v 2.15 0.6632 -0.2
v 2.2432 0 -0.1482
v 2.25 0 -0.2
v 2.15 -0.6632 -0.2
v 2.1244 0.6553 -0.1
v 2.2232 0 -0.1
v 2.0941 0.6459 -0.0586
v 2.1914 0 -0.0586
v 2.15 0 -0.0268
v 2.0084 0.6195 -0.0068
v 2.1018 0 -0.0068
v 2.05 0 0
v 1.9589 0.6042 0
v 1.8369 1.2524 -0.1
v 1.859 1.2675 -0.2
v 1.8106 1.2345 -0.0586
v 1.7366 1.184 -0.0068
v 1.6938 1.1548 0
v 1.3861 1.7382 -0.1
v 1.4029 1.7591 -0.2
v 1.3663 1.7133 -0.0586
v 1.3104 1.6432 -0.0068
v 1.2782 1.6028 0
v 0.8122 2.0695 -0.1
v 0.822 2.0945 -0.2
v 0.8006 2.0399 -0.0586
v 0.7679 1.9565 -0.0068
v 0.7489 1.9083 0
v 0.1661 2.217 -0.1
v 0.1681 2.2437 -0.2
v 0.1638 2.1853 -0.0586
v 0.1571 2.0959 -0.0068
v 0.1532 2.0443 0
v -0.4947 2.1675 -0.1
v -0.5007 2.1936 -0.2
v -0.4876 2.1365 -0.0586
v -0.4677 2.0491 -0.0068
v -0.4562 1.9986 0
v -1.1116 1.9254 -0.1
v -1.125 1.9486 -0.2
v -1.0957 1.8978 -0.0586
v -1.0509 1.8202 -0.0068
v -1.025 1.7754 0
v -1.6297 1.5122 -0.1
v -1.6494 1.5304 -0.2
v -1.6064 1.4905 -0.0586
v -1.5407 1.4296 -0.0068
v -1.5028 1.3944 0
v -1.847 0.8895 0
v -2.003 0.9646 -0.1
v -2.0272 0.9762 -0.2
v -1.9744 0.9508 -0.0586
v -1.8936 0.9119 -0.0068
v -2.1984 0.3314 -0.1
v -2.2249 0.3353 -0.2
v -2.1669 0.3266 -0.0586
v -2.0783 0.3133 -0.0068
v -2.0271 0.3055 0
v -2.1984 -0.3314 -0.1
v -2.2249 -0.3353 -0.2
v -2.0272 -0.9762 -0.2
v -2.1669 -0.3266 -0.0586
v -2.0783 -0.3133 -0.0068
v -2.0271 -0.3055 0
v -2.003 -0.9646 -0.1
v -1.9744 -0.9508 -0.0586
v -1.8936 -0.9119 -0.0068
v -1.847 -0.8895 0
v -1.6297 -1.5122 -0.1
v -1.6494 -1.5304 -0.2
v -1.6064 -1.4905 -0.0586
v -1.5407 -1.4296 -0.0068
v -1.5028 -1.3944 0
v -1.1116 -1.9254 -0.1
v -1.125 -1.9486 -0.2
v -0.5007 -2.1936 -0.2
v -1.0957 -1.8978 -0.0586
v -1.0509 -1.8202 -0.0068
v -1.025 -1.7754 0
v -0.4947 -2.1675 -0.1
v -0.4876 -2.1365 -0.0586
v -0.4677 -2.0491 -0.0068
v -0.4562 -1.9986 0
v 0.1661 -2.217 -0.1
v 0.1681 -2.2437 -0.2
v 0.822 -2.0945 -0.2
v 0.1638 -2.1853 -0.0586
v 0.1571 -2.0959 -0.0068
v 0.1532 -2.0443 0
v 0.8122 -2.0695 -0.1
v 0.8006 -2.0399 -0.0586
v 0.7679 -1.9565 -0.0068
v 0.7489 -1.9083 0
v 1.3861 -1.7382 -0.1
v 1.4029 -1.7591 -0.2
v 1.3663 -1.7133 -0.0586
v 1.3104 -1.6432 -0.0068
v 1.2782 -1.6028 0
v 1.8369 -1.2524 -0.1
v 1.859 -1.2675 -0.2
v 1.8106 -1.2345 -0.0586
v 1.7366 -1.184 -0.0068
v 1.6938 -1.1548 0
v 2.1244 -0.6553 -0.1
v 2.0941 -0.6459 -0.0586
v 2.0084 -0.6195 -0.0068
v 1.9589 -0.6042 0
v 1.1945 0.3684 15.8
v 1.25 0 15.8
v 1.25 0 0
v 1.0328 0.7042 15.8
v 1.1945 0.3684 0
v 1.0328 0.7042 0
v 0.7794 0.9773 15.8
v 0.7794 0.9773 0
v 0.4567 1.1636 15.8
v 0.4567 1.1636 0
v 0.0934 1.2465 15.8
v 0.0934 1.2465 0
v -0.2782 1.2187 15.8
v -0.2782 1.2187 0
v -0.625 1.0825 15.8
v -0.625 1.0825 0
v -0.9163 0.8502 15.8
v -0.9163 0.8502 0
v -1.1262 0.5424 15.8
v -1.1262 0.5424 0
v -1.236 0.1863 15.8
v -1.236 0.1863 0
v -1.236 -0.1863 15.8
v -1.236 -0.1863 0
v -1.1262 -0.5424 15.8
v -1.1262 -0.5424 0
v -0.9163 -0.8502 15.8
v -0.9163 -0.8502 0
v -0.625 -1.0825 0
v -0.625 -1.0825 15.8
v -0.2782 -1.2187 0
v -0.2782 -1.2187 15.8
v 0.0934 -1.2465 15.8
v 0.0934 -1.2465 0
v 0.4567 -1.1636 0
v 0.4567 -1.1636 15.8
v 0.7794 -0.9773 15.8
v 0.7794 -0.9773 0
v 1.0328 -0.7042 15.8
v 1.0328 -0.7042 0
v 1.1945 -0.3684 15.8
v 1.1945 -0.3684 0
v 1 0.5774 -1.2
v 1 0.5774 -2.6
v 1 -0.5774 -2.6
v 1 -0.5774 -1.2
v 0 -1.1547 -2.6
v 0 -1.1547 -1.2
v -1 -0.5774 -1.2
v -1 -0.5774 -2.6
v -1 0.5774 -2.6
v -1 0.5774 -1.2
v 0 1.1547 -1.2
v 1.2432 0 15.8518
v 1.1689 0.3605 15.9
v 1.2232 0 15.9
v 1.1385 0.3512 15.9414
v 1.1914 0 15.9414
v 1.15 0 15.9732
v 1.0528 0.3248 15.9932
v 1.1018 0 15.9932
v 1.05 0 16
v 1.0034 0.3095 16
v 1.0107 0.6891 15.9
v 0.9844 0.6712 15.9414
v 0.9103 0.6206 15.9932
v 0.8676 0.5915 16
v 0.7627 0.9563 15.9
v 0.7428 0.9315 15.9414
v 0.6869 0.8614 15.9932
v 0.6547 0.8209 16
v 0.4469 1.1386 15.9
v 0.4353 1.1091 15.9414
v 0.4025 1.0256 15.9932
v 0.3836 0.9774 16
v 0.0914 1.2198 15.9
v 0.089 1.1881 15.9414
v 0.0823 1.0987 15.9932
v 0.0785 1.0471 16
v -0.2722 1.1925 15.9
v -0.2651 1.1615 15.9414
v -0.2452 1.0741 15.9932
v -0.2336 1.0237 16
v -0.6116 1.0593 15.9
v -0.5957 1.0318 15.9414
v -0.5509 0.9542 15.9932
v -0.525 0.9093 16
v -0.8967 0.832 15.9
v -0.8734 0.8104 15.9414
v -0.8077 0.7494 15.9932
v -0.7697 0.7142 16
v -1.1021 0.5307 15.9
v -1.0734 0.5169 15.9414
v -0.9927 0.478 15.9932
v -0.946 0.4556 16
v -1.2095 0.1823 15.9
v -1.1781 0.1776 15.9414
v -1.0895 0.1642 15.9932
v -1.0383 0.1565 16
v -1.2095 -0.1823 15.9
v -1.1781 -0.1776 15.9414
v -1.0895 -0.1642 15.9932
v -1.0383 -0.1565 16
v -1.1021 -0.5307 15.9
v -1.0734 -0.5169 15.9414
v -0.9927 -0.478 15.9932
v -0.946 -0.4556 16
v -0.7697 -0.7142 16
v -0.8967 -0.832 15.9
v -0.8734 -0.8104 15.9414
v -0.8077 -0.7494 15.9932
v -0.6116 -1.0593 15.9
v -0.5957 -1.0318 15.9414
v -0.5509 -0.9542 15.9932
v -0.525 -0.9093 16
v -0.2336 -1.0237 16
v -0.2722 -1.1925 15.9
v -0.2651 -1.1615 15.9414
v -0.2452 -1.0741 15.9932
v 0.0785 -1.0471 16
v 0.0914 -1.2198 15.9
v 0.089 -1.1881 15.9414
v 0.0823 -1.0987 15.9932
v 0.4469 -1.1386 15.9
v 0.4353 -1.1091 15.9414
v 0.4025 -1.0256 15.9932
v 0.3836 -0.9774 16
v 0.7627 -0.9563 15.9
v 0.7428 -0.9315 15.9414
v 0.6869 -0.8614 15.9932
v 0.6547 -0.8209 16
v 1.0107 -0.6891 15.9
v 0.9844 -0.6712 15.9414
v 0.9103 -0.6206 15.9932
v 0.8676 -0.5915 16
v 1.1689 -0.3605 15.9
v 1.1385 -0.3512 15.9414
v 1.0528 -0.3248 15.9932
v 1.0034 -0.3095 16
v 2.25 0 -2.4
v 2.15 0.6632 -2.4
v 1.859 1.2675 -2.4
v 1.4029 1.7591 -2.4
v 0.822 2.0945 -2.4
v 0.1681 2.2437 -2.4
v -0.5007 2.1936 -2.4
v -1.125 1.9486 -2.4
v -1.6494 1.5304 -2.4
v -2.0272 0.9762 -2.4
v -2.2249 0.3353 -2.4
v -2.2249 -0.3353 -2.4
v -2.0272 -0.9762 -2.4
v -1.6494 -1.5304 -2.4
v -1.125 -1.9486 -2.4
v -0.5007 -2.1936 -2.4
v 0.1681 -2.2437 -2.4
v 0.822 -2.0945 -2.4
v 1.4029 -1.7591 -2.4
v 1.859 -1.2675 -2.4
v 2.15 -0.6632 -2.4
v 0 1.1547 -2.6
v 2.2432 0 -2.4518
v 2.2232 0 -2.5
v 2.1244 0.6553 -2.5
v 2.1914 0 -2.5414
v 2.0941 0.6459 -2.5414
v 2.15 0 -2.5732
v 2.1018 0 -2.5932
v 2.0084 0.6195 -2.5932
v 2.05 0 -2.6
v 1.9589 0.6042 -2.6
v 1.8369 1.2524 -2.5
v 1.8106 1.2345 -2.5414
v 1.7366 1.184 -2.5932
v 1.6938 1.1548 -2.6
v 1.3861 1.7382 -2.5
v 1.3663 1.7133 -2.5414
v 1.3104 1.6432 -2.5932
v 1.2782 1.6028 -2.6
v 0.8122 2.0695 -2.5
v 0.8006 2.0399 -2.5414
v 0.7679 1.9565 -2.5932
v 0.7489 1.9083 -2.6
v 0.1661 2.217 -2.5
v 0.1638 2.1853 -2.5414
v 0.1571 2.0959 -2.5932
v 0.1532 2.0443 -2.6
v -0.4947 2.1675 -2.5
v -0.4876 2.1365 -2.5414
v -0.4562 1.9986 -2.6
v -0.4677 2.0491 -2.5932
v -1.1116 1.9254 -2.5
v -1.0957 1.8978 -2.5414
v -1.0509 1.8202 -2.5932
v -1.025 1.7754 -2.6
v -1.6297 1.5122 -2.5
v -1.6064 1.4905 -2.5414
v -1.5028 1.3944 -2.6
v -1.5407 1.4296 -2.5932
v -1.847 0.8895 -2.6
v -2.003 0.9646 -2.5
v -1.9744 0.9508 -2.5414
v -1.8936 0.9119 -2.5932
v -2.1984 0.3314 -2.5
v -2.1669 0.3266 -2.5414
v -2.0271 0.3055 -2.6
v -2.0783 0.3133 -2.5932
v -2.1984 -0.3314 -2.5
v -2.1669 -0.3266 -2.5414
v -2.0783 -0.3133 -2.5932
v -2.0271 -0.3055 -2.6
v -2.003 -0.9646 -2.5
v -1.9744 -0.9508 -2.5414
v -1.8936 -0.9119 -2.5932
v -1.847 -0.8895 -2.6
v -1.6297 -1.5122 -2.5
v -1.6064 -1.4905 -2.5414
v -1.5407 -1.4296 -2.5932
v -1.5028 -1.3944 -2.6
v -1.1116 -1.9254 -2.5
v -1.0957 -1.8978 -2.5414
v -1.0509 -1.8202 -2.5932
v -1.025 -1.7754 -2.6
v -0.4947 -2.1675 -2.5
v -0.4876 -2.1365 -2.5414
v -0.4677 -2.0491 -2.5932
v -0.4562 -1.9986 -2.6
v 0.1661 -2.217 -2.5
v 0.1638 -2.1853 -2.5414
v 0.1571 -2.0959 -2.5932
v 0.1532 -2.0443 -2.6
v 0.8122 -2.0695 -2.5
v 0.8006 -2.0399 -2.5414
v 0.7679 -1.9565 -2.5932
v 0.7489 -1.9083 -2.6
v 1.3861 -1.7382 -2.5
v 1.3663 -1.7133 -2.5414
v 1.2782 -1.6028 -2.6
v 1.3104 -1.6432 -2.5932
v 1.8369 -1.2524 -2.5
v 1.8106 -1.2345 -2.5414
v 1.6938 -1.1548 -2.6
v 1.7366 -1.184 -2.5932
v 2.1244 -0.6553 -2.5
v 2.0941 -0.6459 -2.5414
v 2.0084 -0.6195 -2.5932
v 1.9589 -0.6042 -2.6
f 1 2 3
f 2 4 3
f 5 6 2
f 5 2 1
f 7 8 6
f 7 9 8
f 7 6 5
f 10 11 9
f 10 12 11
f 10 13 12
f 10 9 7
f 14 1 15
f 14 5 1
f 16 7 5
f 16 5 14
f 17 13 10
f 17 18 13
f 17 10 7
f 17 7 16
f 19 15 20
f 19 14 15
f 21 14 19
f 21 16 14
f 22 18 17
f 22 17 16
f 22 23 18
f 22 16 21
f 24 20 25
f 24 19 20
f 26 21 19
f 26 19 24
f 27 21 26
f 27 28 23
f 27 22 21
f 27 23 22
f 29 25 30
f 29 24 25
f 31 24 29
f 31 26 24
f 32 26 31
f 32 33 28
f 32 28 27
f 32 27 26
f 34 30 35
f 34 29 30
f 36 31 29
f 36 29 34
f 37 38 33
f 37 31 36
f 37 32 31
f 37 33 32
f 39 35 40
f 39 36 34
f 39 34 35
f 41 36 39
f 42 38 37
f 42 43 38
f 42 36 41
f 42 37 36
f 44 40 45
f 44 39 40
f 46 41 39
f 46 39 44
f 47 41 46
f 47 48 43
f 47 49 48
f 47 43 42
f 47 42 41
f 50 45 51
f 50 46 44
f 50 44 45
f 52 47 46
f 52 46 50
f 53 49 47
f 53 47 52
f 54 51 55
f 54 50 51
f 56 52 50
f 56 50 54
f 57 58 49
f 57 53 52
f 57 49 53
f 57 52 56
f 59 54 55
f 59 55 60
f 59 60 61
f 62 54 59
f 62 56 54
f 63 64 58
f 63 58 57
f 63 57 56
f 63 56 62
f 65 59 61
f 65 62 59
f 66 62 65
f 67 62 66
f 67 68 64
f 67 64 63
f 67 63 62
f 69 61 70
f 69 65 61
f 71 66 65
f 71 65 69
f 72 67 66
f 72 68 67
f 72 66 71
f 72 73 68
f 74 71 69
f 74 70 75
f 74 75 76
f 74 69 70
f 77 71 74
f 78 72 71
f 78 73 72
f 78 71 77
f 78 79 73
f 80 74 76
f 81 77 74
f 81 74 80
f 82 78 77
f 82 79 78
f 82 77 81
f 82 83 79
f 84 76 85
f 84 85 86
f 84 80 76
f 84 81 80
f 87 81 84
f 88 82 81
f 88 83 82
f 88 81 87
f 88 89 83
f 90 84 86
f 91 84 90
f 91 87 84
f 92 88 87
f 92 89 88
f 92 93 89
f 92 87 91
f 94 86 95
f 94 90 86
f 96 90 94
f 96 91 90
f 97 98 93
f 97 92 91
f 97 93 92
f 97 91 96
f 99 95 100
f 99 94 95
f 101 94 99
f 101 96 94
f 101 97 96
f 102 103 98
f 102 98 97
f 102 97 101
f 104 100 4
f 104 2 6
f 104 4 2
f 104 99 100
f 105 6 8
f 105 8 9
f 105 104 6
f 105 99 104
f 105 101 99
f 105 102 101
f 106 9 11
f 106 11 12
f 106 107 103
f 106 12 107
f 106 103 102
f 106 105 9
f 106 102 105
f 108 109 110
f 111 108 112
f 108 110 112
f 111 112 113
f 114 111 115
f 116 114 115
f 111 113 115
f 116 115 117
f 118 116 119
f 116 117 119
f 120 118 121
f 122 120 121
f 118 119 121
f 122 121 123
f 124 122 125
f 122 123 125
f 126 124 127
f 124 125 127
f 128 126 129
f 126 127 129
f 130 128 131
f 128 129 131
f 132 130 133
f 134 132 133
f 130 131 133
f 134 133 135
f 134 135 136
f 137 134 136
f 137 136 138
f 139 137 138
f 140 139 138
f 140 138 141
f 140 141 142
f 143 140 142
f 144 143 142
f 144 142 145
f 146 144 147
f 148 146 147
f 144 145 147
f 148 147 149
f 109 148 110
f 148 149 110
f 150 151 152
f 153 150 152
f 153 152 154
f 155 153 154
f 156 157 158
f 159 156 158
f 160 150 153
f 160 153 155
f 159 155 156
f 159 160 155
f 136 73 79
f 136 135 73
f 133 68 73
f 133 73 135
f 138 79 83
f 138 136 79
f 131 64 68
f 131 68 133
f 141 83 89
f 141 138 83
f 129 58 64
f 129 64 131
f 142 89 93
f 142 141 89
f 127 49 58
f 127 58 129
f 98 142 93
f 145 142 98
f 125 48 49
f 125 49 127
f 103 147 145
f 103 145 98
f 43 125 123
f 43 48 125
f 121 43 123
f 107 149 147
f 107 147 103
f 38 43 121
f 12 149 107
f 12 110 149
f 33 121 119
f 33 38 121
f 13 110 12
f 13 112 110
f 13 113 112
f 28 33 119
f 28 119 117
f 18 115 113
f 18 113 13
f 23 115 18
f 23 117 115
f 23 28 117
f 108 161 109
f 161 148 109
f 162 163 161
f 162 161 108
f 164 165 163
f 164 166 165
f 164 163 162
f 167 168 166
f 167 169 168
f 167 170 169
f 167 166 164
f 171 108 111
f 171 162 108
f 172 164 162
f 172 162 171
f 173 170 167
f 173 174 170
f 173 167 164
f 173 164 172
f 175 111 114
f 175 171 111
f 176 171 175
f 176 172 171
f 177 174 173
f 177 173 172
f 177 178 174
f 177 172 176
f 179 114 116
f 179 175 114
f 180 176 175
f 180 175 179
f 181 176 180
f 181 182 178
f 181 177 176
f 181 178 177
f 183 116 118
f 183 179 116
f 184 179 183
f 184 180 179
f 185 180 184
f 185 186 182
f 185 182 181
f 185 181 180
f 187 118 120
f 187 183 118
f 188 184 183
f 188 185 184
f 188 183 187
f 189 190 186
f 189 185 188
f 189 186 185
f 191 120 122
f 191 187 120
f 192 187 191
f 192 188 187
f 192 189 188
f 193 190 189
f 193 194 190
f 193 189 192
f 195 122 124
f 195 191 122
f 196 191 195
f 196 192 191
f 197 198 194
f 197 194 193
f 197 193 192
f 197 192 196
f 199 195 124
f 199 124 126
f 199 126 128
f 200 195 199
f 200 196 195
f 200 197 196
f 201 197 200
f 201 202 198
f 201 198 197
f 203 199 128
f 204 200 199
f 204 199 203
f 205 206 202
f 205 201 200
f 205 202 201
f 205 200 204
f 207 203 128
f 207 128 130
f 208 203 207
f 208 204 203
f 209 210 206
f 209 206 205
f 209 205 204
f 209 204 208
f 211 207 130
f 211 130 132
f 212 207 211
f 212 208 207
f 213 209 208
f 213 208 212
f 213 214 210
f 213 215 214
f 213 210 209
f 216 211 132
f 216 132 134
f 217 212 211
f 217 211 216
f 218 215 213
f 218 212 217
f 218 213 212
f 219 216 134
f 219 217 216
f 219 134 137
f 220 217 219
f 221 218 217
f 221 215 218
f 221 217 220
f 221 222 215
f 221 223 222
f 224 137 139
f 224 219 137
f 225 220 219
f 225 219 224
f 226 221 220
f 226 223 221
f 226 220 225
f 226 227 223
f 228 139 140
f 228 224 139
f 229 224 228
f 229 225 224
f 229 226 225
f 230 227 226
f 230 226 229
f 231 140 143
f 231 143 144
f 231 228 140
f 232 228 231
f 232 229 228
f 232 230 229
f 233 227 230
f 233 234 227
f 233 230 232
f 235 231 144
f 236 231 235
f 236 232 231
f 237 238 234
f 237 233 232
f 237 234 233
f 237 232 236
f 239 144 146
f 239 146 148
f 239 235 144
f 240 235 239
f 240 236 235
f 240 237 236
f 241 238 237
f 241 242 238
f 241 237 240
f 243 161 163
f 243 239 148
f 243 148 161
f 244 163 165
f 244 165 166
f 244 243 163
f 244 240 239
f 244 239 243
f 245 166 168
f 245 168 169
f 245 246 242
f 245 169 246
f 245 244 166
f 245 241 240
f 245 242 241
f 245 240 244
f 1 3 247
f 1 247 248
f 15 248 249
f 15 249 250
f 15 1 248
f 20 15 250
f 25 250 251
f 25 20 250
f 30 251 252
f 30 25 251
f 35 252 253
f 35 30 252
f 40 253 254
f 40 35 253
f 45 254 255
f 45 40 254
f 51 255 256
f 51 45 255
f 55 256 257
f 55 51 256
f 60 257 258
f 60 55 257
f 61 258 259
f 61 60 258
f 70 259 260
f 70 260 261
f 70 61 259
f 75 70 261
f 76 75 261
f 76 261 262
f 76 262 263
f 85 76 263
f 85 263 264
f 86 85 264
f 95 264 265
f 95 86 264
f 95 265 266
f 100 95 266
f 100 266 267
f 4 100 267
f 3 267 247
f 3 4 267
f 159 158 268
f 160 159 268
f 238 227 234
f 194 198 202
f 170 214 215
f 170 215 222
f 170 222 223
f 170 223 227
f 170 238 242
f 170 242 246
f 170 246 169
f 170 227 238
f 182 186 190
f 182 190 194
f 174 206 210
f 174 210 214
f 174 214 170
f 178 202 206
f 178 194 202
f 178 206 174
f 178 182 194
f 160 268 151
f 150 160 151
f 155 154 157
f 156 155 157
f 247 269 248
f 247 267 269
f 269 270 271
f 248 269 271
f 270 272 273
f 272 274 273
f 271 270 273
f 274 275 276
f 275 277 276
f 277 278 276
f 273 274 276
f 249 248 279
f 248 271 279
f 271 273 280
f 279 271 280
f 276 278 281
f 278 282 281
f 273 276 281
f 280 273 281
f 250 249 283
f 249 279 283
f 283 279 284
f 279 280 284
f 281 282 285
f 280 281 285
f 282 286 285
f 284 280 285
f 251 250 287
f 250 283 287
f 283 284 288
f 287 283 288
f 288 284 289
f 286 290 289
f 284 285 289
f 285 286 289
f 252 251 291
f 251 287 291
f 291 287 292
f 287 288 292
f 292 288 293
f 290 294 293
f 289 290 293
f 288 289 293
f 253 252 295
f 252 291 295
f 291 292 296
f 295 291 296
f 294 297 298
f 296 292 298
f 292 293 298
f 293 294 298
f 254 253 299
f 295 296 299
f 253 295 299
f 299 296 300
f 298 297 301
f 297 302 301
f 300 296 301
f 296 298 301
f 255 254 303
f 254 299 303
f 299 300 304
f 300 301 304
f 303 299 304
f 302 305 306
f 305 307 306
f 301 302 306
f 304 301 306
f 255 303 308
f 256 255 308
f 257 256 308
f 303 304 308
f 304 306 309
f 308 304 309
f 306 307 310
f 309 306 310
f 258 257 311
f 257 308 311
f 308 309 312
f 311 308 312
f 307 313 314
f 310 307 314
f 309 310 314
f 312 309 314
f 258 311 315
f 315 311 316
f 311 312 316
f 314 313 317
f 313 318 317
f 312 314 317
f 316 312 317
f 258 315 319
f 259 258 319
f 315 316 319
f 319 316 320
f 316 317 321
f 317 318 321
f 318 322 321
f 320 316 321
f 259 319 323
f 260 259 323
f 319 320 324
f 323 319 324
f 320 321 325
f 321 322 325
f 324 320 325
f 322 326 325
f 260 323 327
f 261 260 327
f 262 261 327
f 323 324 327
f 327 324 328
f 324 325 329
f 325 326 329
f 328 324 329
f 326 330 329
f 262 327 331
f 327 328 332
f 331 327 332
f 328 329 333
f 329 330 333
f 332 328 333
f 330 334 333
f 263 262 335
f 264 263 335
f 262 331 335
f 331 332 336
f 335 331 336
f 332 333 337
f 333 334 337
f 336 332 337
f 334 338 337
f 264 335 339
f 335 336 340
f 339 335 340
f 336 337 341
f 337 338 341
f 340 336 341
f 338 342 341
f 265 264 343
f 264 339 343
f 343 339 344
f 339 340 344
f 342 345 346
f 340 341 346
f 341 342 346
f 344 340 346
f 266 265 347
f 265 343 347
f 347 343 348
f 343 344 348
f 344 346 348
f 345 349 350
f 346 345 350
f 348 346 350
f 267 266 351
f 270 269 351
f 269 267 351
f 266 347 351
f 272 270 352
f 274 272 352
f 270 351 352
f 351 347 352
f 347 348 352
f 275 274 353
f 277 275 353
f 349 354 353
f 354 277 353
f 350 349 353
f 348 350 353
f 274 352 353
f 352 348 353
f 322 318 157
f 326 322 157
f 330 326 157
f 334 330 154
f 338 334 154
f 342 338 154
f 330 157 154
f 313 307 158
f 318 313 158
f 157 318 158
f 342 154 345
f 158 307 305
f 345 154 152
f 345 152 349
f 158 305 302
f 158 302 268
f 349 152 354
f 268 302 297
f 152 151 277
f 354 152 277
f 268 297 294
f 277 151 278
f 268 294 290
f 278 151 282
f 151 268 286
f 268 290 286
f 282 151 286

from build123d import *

# Parameters (mm, degrees)
SKETCH1_R           = 1.25
BOSS_EXTRUDE1_DEPTH = 16
SKETCH1_3_R         = 2.25
BOSS_EXTRUDE2_DEPTH = 2.6
CUT_EXTRUDE1_DEPTH  = 1.4
FILLET1_R           = 0.2


with BuildPart() as part:
    # Sketch1 → Boss-Extrude1 (new body)
    with BuildSketch(Plane.XY):
        Circle(SKETCH1_R)
    extrude(amount=BOSS_EXTRUDE1_DEPTH)

    # Sketch1<3> → Boss-Extrude2 (add)
    with BuildSketch(Plane.XY):
        Circle(SKETCH1_3_R)
    extrude(amount=-BOSS_EXTRUDE2_DEPTH)

    # Sketch2 → Cut-Extrude1 (cut)
    with BuildSketch(Plane(origin=(0, 0, -2.6), x_dir=(-1, 0, 0), z_dir=(0, 0, -1))):
        Polygon((0, 1.154700538), (-1, 0.577350269), (-1, -0.577350269), (0, -1.154700538), (1, -0.577350269), (1, 0.577350269), align=None)
    extrude(amount=-CUT_EXTRUDE1_DEPTH, mode=Mode.SUBTRACT)

    # Fillet1
    fillet1_edges = [part.edges().sort_by_distance(p)[0] for p in [
        (-1.25, 0, 16),
        (-2.25, 0, 0),
        (-2.25, 0, -2.6),
    ]]
    fillet(fillet1_edges, radius=FILLET1_R)


solid = part.part
